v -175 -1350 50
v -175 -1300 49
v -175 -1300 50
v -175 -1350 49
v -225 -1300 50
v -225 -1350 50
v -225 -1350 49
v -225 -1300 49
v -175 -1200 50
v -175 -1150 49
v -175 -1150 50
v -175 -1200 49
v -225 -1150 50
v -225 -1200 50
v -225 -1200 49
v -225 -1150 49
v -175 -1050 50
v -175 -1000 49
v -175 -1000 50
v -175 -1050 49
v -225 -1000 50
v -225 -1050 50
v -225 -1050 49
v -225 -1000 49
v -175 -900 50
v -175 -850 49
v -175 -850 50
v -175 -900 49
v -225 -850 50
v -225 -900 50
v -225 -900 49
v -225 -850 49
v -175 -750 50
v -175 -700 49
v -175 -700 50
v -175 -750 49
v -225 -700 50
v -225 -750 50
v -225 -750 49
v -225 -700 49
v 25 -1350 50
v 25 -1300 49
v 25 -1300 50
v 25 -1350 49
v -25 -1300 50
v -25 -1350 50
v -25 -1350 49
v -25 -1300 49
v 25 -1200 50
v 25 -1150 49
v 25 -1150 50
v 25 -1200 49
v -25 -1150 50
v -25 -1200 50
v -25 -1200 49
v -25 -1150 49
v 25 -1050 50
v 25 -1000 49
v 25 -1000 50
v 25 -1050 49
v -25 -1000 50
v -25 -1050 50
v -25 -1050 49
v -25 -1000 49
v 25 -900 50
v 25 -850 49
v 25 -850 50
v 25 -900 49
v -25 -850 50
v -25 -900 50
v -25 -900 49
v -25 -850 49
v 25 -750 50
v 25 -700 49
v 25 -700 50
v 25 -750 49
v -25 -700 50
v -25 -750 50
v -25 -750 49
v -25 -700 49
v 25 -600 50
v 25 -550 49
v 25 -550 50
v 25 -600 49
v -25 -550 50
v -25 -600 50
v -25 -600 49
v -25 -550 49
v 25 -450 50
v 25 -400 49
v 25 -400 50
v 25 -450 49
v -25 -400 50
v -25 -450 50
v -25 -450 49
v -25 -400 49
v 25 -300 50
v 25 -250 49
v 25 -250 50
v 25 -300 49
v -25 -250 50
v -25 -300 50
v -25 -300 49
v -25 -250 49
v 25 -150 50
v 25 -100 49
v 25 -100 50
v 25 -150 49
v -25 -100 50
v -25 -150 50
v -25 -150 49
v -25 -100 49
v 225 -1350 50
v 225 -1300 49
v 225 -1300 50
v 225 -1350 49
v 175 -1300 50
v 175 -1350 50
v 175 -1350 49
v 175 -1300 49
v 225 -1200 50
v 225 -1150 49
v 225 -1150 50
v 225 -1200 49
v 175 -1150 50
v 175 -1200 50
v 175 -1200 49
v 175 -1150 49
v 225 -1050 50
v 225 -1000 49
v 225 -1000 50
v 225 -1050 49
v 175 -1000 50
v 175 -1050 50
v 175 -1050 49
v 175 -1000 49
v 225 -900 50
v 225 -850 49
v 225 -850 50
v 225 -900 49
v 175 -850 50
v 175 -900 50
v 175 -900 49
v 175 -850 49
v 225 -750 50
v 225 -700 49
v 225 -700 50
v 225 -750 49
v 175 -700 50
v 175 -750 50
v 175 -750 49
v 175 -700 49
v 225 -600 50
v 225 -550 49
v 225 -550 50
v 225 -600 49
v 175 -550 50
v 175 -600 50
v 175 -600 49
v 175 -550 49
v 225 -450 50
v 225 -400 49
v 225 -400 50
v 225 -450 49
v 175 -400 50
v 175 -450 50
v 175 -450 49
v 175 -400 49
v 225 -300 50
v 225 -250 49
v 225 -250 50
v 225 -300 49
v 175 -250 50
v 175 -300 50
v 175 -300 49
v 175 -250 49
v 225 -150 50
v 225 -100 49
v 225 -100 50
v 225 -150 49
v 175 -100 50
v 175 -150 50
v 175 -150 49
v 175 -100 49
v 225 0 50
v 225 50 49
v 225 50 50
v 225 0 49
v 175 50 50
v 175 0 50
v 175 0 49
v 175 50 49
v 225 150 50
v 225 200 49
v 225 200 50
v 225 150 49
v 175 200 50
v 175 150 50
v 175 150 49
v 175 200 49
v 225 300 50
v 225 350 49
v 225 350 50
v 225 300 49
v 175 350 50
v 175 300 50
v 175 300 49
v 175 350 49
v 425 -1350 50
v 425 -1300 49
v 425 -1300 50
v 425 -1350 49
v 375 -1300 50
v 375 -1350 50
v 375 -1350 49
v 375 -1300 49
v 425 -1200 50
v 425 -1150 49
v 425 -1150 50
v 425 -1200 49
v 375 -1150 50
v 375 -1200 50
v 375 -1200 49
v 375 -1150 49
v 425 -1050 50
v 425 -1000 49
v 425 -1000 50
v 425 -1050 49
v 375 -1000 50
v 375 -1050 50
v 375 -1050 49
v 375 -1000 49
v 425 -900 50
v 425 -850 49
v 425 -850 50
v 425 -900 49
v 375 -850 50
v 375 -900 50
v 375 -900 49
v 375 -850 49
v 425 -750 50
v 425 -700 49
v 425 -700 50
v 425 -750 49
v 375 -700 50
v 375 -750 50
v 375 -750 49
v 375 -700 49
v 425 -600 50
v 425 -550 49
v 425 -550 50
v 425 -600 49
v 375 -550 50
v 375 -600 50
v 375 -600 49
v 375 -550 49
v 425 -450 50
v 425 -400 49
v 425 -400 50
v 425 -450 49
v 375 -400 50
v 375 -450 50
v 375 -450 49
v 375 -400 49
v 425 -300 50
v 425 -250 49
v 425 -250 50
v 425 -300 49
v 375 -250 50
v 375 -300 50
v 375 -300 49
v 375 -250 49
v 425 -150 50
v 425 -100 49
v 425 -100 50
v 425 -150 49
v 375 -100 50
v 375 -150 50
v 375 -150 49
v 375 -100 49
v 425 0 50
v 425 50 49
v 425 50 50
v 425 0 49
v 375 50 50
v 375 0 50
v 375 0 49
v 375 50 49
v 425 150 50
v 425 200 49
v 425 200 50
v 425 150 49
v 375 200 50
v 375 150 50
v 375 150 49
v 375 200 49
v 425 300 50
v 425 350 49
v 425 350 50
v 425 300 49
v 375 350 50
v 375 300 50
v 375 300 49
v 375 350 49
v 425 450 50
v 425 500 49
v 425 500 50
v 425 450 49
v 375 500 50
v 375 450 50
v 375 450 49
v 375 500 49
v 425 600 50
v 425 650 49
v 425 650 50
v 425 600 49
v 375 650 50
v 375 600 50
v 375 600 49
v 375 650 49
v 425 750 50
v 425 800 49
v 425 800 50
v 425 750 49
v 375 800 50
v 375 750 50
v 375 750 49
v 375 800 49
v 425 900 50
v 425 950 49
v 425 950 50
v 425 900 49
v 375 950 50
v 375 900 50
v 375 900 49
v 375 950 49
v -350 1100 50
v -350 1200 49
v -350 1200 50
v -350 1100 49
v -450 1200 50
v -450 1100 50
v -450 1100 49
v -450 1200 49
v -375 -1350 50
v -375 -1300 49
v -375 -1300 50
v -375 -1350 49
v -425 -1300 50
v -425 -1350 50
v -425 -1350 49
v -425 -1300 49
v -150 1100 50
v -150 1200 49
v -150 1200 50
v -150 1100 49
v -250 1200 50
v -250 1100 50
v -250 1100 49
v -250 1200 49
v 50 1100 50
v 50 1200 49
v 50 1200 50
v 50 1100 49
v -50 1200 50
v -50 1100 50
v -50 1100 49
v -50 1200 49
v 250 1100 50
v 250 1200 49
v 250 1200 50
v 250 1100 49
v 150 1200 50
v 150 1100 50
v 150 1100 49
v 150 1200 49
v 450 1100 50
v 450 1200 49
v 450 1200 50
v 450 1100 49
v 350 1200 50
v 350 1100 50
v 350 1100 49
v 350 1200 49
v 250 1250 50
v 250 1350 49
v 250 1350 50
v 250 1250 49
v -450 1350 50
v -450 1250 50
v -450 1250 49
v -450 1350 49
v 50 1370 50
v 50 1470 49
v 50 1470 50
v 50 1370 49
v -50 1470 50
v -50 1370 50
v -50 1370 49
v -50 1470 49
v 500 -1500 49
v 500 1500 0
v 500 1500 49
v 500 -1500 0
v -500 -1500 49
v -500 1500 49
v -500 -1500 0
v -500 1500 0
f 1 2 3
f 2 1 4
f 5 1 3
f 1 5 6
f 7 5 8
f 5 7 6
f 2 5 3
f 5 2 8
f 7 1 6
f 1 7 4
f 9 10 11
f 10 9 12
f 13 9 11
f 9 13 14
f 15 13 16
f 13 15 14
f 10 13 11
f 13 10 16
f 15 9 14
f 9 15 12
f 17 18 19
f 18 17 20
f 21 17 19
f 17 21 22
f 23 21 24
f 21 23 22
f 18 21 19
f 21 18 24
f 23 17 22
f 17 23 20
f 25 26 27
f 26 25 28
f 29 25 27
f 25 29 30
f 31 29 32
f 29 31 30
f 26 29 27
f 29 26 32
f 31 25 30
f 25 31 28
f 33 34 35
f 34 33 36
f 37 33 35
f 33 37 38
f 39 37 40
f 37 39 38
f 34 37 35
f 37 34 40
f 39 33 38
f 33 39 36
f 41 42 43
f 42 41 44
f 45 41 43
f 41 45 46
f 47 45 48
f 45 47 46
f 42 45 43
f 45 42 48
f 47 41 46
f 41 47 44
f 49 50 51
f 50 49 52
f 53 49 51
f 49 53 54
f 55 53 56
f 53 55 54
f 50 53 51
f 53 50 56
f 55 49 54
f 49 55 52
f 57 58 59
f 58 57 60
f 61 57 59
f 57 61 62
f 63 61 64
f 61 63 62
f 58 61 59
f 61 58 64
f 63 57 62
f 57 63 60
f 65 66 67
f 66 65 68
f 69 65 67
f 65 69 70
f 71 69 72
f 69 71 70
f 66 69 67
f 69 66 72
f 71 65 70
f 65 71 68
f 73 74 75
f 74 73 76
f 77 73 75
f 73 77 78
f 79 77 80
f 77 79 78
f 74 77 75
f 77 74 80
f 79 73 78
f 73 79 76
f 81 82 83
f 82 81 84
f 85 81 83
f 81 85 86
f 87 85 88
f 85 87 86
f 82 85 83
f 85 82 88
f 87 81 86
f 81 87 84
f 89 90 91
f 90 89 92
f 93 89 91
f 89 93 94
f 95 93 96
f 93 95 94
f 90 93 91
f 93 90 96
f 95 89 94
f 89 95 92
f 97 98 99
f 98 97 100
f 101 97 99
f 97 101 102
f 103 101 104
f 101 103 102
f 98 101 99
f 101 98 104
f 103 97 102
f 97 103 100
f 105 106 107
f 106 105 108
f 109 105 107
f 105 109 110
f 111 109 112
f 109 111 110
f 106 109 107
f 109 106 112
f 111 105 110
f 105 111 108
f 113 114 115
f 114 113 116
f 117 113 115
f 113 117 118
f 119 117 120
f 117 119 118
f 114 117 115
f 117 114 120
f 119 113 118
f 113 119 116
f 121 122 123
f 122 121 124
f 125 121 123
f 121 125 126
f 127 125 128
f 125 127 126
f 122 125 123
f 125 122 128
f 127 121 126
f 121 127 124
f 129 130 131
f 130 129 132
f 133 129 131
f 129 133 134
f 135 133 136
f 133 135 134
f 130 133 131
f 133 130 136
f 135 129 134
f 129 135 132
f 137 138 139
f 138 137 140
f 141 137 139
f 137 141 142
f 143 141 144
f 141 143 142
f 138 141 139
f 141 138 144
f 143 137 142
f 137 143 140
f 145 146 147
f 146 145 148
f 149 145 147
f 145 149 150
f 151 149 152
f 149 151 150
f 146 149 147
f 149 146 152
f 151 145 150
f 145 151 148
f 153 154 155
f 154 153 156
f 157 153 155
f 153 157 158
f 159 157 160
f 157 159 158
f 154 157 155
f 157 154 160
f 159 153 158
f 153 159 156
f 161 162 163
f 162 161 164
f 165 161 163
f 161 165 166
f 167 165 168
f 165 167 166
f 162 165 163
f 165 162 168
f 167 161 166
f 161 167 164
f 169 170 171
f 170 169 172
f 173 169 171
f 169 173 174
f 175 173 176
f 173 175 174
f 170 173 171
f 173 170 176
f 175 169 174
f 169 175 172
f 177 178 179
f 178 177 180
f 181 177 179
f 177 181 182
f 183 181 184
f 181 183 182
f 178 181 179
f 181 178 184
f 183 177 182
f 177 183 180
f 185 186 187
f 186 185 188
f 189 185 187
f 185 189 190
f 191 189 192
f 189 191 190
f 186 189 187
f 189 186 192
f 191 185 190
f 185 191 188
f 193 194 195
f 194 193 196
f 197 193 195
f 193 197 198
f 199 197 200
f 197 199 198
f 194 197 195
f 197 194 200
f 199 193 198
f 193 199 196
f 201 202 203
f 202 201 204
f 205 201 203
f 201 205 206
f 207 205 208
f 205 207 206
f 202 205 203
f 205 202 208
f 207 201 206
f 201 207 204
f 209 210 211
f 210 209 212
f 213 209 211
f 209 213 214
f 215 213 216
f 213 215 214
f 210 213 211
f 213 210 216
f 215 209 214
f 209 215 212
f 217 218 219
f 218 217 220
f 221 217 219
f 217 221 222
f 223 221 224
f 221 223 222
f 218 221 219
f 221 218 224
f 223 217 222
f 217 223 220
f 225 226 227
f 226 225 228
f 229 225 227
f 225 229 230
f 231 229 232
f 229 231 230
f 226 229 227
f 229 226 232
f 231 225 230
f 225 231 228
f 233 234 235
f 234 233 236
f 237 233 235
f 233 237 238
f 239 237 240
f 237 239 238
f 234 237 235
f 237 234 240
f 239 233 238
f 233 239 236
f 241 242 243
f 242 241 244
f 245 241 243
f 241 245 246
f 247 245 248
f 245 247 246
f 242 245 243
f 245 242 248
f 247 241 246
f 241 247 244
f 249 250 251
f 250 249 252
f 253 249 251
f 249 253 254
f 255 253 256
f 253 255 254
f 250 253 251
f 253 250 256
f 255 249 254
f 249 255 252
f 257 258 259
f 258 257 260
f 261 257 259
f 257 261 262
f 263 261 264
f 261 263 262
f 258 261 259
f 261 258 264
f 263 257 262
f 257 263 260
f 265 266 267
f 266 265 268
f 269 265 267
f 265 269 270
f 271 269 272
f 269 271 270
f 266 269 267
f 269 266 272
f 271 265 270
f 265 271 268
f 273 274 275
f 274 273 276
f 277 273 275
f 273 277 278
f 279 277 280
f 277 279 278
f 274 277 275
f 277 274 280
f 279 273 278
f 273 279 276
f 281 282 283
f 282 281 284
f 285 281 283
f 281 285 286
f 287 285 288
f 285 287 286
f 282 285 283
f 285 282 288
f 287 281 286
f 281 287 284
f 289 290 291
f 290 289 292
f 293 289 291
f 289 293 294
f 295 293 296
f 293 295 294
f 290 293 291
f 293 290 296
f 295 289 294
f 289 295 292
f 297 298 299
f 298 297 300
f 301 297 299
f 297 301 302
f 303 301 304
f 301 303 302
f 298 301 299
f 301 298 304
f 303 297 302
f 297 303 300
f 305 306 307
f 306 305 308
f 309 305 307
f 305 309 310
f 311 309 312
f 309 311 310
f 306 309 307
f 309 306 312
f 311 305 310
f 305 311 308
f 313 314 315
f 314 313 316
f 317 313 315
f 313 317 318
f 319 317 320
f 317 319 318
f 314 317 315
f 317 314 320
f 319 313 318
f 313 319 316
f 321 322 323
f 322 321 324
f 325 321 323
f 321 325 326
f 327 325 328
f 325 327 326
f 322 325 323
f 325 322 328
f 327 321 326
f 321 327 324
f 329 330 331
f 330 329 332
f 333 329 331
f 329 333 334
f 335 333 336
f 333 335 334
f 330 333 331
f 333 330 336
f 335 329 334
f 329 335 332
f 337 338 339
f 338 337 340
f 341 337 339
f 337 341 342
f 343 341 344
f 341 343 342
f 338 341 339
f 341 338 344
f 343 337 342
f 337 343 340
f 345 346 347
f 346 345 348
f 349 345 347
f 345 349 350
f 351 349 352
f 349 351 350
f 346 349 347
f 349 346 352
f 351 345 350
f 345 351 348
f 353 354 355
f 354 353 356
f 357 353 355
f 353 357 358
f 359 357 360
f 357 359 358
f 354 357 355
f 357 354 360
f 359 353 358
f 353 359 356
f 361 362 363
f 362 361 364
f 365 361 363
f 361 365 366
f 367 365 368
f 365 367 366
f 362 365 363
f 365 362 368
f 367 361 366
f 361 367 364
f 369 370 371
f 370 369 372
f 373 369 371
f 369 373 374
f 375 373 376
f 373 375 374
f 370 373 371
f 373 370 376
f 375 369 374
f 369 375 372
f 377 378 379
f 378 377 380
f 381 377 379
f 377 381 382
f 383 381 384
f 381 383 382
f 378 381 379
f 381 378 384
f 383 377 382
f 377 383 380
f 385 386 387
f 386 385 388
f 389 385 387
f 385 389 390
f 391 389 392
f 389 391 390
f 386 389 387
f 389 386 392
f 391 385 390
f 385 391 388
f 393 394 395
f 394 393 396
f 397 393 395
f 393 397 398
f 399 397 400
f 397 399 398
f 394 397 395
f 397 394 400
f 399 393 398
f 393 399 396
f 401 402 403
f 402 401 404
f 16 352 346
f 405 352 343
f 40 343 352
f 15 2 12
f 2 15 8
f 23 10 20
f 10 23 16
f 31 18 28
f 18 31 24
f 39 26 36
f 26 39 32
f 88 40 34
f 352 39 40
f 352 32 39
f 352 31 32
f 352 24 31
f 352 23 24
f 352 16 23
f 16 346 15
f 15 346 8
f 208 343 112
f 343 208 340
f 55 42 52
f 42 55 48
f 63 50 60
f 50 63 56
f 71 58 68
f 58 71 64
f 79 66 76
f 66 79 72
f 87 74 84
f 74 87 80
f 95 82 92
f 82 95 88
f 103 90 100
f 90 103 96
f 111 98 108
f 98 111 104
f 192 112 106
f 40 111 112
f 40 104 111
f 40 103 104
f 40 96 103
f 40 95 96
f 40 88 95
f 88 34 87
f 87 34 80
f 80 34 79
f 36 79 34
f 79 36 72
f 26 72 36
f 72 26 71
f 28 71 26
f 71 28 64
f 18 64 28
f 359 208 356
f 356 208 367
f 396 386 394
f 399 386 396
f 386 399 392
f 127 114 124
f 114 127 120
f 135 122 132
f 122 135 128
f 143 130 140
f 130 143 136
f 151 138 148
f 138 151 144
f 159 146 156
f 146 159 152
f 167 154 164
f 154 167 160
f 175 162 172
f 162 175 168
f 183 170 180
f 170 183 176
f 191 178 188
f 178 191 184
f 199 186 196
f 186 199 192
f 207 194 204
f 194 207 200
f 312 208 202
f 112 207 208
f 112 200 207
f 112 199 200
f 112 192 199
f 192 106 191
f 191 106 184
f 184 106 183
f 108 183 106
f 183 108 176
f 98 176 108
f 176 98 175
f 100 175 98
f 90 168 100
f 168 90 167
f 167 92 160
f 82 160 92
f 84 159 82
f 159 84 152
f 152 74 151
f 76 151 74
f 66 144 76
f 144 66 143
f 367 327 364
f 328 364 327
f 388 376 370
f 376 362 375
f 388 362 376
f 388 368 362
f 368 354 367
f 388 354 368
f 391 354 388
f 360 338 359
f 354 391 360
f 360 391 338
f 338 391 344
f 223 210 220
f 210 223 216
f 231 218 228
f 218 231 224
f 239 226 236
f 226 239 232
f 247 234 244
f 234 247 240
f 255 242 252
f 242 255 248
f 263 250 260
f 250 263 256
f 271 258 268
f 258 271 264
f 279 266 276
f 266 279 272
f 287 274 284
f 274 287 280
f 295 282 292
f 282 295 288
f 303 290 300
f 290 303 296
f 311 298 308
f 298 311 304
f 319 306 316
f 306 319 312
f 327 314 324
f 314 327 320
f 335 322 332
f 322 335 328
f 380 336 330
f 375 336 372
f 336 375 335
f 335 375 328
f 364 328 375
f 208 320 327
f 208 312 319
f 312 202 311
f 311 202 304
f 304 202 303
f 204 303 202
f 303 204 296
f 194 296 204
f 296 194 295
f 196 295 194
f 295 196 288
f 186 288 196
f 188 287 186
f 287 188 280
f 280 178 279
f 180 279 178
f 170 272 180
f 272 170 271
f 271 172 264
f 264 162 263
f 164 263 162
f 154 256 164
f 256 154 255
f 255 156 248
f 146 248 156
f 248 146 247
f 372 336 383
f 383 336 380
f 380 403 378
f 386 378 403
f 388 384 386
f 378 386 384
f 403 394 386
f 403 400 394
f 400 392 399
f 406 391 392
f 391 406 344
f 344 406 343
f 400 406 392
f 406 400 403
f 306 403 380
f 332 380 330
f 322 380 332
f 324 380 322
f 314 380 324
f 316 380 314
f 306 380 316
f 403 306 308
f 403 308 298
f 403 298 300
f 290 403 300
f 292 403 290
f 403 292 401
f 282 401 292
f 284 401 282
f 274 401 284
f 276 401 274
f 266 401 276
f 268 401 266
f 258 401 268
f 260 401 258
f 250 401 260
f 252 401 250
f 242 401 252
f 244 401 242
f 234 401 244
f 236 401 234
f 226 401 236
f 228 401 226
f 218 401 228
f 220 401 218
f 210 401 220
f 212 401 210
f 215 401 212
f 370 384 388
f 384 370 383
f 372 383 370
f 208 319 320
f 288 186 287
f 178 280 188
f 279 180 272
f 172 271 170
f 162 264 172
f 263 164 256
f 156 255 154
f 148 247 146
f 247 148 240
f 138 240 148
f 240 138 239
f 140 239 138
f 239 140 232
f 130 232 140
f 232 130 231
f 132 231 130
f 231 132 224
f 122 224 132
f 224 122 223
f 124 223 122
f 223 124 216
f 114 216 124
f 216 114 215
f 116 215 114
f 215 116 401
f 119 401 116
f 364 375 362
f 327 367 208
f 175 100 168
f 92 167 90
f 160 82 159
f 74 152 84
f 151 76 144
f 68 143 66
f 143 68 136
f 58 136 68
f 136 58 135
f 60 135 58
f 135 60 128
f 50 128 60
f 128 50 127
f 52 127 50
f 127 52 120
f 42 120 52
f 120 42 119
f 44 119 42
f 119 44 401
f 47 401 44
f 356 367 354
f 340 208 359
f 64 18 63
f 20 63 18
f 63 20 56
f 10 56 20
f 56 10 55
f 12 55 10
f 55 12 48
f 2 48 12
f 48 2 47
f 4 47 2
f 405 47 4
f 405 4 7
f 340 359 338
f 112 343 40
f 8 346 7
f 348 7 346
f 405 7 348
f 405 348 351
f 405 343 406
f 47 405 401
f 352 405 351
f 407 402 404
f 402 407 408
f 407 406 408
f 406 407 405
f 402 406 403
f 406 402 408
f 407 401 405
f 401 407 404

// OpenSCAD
translate([-500,-1500,0]){
	translate([50,2750,25]) color([1,1,1],1){cube([700,100,25]);};
	translate([450,2870,25]) color([0,0,1],1){cube([100,100,25]);};
	for (i = [100:200:900]){
		translate([i-50,2600,25]) color([1-i/900.0,i/900.0,0],1){cube([100,100,25]);};
		for (z = [150:150:i*2.7]){
			translate([i-25,z,25])color("goldenrod",1){cube([50,50,25]);};
			};
	}
	color("black",1){cube([1000,3000,49]);};
};
